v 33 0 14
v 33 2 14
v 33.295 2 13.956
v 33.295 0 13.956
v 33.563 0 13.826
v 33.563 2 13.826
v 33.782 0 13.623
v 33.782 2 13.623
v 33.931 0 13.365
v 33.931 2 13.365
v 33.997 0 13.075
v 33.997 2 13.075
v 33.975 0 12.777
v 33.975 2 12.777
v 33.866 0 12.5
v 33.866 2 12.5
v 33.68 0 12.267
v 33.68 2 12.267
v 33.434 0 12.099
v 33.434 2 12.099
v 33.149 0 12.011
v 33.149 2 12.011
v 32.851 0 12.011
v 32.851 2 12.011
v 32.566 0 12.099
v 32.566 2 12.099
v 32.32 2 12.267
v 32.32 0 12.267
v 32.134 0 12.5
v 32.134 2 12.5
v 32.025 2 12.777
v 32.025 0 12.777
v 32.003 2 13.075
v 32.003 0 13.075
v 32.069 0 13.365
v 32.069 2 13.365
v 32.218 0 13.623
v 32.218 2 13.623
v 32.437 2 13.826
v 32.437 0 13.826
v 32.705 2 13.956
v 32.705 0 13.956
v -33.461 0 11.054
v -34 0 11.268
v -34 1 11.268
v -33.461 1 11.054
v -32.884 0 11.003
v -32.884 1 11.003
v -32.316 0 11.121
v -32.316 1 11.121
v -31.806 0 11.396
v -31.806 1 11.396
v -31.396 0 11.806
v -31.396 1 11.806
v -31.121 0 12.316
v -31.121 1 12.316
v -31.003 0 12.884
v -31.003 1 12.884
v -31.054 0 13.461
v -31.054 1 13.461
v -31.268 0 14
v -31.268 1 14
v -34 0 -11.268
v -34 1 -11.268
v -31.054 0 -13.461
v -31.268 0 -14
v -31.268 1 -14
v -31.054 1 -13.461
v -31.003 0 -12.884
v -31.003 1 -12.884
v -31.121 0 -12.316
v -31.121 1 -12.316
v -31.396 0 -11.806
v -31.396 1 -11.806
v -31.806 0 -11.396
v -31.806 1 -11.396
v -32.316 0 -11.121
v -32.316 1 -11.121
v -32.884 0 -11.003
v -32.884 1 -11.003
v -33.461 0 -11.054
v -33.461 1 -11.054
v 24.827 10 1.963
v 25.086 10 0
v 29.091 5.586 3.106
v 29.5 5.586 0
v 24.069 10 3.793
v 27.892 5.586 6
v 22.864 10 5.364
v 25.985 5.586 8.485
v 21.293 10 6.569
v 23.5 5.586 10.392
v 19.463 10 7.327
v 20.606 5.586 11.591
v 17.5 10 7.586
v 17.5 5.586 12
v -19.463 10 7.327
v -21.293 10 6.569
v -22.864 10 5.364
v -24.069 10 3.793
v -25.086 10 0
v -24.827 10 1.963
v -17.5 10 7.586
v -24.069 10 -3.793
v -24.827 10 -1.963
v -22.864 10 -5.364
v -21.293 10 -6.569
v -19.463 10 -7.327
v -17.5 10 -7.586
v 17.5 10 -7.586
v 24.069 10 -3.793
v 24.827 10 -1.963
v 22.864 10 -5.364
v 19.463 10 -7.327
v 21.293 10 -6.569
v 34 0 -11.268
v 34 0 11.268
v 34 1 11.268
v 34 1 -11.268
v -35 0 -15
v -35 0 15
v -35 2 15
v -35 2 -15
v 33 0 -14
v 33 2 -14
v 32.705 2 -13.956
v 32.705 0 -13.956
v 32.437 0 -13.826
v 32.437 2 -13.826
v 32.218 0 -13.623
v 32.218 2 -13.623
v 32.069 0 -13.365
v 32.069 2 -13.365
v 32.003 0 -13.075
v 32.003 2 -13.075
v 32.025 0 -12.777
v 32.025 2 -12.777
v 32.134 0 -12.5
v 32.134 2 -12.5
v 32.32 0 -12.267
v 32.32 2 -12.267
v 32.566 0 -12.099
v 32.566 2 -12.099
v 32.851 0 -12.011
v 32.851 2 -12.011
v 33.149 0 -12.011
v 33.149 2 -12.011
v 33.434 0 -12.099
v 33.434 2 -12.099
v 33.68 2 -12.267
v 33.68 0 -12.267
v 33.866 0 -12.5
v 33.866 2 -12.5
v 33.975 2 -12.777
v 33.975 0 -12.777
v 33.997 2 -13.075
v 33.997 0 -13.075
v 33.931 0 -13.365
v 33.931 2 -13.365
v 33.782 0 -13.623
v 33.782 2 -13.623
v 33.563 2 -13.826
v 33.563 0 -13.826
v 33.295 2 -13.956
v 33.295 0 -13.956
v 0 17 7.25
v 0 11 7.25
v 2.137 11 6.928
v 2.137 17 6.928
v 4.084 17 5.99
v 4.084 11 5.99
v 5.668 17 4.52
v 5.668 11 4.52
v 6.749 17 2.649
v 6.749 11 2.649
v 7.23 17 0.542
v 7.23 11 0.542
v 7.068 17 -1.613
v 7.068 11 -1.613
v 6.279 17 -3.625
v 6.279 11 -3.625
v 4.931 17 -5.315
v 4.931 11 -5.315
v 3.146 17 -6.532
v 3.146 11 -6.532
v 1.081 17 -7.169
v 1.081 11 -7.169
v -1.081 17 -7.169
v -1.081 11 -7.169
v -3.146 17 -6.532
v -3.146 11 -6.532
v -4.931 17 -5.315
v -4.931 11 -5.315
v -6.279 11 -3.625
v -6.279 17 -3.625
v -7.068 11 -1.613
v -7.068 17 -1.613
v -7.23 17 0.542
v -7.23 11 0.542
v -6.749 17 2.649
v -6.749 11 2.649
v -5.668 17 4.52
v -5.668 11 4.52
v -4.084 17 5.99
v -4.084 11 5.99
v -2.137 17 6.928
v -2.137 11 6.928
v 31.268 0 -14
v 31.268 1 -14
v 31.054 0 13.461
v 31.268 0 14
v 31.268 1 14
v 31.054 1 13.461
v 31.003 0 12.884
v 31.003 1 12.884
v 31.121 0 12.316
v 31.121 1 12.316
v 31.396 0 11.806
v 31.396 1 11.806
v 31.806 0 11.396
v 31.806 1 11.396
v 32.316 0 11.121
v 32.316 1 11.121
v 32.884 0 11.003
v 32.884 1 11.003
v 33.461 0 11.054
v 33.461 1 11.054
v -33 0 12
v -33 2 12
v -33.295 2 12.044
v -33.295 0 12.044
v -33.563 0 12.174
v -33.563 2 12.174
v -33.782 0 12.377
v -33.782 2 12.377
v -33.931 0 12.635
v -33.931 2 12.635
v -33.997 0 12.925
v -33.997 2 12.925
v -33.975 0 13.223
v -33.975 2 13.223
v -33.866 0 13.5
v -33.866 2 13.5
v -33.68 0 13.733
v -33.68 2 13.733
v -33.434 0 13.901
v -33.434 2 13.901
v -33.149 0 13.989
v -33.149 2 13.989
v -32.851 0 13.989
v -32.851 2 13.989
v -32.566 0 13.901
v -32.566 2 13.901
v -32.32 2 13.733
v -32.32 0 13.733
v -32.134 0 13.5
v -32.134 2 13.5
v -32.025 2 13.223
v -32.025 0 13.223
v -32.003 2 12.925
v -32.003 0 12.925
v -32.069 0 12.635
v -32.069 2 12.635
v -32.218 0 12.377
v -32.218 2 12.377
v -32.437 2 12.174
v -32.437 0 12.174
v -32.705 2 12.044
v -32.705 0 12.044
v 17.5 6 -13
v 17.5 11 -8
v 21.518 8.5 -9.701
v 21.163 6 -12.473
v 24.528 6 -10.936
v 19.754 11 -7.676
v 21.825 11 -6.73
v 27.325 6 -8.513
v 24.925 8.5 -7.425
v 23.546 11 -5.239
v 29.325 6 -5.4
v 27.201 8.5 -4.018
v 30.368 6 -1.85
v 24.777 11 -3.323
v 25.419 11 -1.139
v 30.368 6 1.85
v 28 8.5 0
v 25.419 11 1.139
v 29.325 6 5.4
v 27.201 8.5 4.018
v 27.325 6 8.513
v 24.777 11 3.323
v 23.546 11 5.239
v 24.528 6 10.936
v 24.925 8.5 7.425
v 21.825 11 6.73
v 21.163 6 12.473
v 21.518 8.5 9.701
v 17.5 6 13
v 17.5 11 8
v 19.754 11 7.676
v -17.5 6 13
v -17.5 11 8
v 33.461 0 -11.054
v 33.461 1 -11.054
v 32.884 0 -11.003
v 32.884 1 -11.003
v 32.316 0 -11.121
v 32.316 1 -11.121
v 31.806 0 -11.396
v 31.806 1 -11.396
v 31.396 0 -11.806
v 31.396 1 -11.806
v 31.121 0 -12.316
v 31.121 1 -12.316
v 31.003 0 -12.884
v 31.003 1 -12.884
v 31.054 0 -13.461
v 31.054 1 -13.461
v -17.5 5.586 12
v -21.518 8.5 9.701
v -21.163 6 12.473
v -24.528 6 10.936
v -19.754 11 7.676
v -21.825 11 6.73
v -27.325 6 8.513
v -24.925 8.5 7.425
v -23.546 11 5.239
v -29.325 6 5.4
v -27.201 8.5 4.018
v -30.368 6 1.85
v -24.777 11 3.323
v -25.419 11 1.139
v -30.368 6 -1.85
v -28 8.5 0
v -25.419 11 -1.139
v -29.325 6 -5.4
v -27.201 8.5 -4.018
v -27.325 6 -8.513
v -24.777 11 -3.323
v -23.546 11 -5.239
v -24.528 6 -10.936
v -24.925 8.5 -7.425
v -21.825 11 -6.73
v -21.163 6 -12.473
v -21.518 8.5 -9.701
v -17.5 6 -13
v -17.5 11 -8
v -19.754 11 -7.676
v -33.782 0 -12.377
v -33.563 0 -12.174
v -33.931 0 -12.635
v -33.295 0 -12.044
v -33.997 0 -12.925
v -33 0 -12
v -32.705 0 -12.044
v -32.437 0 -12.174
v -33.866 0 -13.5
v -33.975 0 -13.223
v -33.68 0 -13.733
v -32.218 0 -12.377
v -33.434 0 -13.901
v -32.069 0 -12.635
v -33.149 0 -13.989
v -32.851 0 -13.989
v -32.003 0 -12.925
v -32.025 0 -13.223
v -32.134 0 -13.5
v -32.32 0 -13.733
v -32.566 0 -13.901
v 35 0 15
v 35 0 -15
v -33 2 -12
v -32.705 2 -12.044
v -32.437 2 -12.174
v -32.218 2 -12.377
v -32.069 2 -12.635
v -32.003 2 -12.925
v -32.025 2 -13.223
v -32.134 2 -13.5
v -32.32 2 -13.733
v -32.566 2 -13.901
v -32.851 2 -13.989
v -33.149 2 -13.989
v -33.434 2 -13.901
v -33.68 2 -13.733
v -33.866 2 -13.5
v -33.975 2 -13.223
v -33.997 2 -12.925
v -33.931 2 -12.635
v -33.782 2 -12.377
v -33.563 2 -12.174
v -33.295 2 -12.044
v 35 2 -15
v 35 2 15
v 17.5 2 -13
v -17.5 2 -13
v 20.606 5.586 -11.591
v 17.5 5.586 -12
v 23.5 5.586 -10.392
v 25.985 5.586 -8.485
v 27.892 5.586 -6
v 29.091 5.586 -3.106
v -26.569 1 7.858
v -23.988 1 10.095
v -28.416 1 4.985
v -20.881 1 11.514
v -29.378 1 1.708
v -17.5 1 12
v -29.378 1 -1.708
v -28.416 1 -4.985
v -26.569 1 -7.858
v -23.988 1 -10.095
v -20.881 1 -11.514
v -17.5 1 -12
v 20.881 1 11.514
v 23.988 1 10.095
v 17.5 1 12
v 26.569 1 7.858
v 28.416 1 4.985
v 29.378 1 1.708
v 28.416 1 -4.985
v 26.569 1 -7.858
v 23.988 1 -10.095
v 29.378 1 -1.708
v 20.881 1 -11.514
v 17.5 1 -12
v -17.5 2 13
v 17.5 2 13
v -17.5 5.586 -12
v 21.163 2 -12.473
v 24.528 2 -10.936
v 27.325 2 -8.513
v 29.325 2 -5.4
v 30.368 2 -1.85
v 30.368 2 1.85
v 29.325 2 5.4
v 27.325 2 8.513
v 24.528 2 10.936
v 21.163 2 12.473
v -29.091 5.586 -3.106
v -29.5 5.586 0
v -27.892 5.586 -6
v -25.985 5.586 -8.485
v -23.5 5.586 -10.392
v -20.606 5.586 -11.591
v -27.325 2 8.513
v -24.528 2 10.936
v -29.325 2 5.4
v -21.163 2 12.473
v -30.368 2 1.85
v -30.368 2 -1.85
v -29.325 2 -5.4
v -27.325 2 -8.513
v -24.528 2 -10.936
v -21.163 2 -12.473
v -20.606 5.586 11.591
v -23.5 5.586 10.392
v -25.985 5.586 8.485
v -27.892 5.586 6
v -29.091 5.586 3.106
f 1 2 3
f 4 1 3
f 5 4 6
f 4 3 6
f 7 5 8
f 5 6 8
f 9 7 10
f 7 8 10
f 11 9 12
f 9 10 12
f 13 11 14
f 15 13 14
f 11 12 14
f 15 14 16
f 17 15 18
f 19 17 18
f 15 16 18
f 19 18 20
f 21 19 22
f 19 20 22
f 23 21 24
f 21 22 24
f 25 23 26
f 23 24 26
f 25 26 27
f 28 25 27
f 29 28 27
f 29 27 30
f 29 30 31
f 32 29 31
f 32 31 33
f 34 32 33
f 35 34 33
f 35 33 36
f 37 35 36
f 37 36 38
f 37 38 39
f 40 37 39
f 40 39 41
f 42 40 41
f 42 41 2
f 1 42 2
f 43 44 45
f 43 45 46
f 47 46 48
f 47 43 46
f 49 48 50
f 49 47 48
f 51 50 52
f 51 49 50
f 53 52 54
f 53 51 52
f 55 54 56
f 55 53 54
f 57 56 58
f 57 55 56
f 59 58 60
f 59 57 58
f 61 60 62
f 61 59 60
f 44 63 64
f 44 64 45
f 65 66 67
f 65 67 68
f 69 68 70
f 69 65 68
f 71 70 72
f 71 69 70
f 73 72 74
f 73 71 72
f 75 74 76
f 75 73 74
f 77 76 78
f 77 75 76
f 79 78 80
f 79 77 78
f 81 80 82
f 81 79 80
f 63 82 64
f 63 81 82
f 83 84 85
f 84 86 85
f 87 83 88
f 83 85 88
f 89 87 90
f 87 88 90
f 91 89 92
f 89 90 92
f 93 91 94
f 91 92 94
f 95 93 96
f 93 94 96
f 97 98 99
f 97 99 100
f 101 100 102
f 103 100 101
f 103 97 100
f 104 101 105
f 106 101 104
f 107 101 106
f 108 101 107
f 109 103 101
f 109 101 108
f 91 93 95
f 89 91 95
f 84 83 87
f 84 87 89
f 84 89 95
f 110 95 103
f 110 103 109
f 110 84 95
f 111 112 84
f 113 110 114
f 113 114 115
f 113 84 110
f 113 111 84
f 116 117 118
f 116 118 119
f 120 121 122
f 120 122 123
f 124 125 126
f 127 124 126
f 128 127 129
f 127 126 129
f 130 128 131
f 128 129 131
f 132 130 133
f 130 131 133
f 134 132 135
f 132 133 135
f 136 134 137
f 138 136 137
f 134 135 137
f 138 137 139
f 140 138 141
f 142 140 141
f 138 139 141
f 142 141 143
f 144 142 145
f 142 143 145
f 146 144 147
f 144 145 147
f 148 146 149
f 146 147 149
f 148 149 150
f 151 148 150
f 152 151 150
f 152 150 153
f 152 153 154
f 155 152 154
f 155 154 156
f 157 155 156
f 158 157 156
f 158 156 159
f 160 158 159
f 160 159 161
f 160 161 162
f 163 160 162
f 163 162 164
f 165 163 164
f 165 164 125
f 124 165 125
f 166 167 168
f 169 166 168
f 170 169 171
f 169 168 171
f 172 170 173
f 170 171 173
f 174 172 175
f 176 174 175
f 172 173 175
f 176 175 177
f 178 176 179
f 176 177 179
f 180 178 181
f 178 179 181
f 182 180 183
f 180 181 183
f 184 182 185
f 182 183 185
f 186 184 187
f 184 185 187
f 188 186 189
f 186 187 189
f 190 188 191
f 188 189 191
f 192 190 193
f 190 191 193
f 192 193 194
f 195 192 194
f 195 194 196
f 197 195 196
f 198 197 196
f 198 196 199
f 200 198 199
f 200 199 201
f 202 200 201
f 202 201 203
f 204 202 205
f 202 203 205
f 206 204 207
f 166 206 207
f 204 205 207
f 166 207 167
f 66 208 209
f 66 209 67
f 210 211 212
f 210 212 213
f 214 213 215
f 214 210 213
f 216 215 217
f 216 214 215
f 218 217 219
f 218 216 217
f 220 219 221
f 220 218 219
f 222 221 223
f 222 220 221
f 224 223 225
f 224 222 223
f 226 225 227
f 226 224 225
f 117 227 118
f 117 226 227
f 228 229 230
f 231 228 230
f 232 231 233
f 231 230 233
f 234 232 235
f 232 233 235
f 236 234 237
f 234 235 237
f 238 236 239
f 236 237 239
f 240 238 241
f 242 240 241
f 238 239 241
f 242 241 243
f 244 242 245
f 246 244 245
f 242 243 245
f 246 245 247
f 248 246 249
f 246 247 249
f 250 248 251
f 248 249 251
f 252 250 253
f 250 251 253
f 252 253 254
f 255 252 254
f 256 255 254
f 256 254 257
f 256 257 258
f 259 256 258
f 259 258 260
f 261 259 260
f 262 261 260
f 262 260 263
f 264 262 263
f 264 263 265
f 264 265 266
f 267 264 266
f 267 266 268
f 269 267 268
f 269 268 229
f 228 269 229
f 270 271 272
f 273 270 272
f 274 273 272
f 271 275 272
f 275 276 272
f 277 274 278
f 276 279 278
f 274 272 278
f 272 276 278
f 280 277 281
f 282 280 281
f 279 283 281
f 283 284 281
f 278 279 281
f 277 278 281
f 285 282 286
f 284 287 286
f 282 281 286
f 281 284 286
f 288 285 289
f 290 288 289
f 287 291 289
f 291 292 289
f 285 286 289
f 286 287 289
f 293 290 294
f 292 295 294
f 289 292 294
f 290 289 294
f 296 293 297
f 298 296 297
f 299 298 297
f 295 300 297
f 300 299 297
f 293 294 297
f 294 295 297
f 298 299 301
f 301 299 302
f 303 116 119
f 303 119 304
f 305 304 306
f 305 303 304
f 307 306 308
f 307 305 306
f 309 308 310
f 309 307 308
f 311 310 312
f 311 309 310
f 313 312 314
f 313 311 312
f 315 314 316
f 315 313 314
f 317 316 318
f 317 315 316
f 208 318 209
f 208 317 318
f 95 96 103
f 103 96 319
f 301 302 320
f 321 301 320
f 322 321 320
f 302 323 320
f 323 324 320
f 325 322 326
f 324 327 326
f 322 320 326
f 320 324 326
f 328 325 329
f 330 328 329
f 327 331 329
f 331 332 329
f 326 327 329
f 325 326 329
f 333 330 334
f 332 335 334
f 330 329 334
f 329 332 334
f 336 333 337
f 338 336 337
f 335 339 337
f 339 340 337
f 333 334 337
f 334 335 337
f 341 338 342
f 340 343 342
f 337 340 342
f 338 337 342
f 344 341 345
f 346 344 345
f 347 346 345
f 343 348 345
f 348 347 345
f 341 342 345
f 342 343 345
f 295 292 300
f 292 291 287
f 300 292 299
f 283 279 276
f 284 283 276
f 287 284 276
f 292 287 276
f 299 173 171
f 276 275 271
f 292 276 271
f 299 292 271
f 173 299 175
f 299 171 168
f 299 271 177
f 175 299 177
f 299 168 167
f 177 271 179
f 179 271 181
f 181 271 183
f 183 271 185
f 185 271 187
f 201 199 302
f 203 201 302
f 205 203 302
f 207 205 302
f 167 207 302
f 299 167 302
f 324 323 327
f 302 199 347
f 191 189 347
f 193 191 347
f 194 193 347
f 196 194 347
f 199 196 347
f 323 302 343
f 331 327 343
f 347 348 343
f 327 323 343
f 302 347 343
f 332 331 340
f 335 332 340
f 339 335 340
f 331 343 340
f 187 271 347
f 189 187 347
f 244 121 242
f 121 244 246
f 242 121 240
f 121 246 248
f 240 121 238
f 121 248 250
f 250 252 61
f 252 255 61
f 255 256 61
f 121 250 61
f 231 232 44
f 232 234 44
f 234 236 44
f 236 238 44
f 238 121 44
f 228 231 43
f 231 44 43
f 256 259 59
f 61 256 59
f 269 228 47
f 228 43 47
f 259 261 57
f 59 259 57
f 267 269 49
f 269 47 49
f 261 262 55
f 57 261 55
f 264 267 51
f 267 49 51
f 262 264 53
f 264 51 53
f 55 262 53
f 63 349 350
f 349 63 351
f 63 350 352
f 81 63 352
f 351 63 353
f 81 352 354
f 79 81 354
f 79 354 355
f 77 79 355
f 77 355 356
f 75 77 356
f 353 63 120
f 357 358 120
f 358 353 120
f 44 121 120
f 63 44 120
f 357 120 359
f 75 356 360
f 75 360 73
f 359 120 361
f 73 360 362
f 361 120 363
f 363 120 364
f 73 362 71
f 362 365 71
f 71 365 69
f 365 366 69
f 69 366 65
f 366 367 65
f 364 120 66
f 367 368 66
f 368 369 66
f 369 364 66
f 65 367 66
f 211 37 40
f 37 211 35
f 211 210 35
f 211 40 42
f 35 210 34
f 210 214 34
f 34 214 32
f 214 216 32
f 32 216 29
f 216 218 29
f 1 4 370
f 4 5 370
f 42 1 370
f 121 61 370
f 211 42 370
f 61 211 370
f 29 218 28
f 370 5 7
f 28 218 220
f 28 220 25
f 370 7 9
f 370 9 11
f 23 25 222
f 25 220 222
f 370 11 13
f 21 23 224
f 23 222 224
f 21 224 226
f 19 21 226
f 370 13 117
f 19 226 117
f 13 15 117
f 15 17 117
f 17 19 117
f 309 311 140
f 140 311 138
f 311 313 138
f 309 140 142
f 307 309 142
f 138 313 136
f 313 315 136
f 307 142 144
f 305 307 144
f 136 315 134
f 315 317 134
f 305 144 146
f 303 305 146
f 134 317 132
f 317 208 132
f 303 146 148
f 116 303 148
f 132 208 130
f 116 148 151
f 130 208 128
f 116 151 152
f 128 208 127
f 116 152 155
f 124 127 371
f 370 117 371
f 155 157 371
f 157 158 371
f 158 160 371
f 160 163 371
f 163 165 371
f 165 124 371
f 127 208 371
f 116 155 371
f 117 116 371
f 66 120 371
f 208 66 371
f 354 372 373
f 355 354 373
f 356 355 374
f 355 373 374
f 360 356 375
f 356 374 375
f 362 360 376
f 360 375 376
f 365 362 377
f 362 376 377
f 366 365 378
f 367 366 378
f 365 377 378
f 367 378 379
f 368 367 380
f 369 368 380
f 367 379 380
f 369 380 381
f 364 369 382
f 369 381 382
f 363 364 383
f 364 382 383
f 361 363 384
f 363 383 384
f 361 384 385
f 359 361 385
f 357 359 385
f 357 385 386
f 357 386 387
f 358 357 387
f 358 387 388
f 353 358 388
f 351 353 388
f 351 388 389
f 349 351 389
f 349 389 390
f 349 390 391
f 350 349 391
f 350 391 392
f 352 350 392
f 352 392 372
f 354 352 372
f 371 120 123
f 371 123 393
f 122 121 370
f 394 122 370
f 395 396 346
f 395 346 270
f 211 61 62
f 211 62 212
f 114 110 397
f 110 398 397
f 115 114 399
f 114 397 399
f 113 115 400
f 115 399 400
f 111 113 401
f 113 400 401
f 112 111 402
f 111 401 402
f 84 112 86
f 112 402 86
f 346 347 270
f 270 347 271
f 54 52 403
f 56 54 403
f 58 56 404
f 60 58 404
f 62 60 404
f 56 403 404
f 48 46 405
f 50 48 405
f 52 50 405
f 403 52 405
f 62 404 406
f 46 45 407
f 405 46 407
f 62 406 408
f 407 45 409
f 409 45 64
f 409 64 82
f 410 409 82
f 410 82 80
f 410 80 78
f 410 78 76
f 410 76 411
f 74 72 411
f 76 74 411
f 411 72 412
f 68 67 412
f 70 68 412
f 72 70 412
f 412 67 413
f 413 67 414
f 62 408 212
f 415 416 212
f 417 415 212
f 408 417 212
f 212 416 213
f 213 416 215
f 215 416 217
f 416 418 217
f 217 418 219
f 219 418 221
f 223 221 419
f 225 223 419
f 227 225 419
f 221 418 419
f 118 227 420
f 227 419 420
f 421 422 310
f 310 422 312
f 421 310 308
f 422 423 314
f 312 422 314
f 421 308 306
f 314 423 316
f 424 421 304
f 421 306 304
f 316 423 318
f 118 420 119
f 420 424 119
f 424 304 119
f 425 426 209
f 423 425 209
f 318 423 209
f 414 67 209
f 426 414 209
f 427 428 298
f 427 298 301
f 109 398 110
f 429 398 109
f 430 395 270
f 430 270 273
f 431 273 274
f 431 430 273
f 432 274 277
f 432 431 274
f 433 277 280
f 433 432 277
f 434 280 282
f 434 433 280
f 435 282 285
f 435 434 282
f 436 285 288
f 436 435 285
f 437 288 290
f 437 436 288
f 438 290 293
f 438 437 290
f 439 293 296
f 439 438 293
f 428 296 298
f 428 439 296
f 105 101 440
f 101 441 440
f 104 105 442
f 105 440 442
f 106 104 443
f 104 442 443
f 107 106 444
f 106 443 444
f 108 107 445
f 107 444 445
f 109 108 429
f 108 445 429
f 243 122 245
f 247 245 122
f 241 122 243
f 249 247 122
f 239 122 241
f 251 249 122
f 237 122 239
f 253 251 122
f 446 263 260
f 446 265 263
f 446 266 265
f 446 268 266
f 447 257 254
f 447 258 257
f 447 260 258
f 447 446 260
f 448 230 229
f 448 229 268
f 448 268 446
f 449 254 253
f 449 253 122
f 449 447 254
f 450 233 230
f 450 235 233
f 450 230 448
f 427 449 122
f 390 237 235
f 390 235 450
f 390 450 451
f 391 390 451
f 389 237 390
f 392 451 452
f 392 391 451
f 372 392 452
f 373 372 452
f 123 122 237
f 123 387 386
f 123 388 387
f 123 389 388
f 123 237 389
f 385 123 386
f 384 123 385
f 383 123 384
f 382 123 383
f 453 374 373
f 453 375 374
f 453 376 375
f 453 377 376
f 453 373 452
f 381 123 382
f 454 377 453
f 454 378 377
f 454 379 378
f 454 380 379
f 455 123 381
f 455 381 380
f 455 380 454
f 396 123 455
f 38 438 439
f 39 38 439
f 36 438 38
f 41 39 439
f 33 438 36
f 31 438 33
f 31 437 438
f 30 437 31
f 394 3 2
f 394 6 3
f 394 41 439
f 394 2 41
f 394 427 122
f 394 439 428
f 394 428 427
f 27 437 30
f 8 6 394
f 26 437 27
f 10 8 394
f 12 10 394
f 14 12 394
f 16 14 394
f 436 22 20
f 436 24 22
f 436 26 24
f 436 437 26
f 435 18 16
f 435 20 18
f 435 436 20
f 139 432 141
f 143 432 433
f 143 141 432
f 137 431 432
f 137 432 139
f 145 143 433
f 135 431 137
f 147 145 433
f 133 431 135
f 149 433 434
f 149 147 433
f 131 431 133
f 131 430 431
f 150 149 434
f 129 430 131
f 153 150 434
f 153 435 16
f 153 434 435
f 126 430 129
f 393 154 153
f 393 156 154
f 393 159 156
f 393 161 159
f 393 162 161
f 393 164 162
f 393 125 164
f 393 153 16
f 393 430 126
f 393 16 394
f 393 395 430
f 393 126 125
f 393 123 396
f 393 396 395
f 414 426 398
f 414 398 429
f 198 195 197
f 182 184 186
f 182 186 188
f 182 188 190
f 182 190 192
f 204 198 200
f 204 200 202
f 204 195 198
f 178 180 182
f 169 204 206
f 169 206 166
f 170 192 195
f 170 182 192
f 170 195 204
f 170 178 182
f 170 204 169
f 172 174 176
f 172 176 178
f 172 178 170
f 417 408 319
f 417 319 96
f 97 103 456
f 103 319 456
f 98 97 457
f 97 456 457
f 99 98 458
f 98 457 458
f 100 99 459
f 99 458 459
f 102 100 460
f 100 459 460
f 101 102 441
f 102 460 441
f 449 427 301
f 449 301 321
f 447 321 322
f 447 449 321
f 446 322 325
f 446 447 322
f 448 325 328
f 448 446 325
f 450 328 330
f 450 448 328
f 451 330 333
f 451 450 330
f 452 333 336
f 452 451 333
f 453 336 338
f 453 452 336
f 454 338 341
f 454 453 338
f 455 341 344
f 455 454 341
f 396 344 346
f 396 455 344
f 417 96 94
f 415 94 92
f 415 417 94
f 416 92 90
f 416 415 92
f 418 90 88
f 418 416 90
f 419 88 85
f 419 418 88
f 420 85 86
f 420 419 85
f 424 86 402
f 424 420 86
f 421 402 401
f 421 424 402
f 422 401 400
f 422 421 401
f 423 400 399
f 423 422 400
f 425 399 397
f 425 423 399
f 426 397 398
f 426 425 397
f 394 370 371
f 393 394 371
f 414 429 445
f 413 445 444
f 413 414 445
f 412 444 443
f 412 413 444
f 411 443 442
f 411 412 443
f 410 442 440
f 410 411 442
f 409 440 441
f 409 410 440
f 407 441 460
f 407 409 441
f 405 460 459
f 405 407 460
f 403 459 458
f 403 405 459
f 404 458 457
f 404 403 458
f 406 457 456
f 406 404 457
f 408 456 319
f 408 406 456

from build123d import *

# Parameters (mm, degrees)
SKETCH_1_W          = 70
SKETCH_1_H          = 30
EXTRUDE_1_DEPTH     = 2
SKETCH_2_R          = 1
CUT_EXTRUDE_1_DEPTH = 39.13135193
EXTRUDE_2_DEPTH     = 9
CHAMFER_2_SIZE      = 5
SHELL_2_DEPTH       = 5.585786438
SHELL_2_2_DEPTH     = 1
SKETCH_4_R          = 7.25
EXTRUDE_3_DEPTH     = 6


with BuildPart() as part:
    # 草图1 → 凸台-拉伸1 (new body)
    with BuildSketch(Plane(origin=(0, 0, 0), x_dir=(1, 0, 0), z_dir=(0, 1, 0))):
        Rectangle(SKETCH_1_W, SKETCH_1_H)
    extrude(amount=EXTRUDE_1_DEPTH)

    # 草图2 → 切除-拉伸1 (cut, through all)
    with BuildSketch(Plane(origin=(0, 2, 0), x_dir=(1, 0, 0), z_dir=(0, 1, 0))):
        with Locations(Location((-33, 13, 0), (0, 0, 270))):
            Circle(SKETCH_2_R)
        with Locations(Location((33, 13, 0), (0, 0, 90))):
            Circle(SKETCH_2_R)
        with Locations(Location((33, -13, 0), (0, 0, 270))):
            Circle(SKETCH_2_R)
        with Locations(Location((-33, -13, 0), (0, 0, 90))):
            Circle(SKETCH_2_R)
    extrude(amount=-CUT_EXTRUDE_1_DEPTH, mode=Mode.SUBTRACT)

    # 草图3 → 凸台-拉伸2 (add)
    with BuildSketch(Plane(origin=(0, 2, 0), x_dir=(1, 0, 0), z_dir=(0, 1, 0))):
        with BuildLine():
            Line((-17.5, 13), (17.5, 13))
            ThreePointArc((17.5, 13), (30.5, 0), (17.5, -13))
            Line((17.5, -13), (-17.5, -13))
            ThreePointArc((-17.5, -13), (-30.5, 0), (-17.5, 13))
        make_face()
    extrude(amount=EXTRUDE_2_DEPTH)

    # 倒角2
    chamfer_2_edges = [part.edges().sort_by_distance(p)[0] for p in [
        (-30.5, 11, 0),
        (0, 11, 13),
        (30.5, 11, 0),
        (0, 11, -13),
    ]]
    chamfer(chamfer_2_edges, length=CHAMFER_2_SIZE)

    # 抽壳2: read off the stored shape, not the designer's step
    # 抽壳2 outline → 抽壳2 (cut)
    with BuildSketch(Plane(origin=(0, 0, 0), x_dir=(1, 0, 0), z_dir=(0, 1, 0))):
        with BuildLine():
            ThreePointArc((-17.5, 12), (-29.5, 0), (-17.5, -12))
            Line((-17.5, -12), (17.5, -12))
            ThreePointArc((17.5, -12), (29.5, 0), (17.5, 12))
            Line((17.5, 12), (-17.5, 12))
        make_face()
    extrude(amount=SHELL_2_DEPTH, mode=Mode.SUBTRACT)

    # Shell 2 2 outline → Shell 2 2 (cut)
    with BuildSketch(Plane(origin=(0, 0, 0), x_dir=(1, 0, 0), z_dir=(0, 1, 0))):
        with BuildLine():
            Line((-34, 11.267949192), (-34, -11.267949192))
            ThreePointArc((-34, -11.267949192), (-31.585786438, -11.585786438), (-31.267949192, -14))
            Line((-31.267949192, -14), (31.267949192, -14))
            ThreePointArc((31.267949192, -14), (31.585786438, -11.585786438), (34, -11.267949192))
            Line((34, -11.267949192), (34, 11.267949192))
            ThreePointArc((34, 11.267949192), (31.585786438, 11.585786438), (31.267949192, 14))
            Line((31.267949192, 14), (-31.267949192, 14))
            ThreePointArc((-31.267949192, 14), (-31.585786438, 11.585786438), (-34, 11.267949192))
        make_face()
        with BuildLine():
            Line((17.5, -12), (-17.5, -12))
            ThreePointArc((-17.5, -12), (-29.5, 0), (-17.5, 12))
            Line((-17.5, 12), (17.5, 12))
            ThreePointArc((17.5, 12), (29.5, 0), (17.5, -12))
        make_face(mode=Mode.SUBTRACT)
    extrude(amount=SHELL_2_2_DEPTH, mode=Mode.SUBTRACT)

    # Shell 2 3: loft between two sections, ruled curve by curve
    shell_2_3_from = [
        Edge.make_three_point_arc((17.5, 10, -7.585786438), (22.863961031, 10, -5.363961031), (25.085786438, 10, 0)),
        Edge.make_three_point_arc((25.085786438, 10, 0), (22.863961031, 10, 5.363961031), (17.5, 10, 7.585786438)),
        Edge.make_three_point_arc((-17.5, 10, 7.585786438), (-22.863961031, 10, 5.363961031), (-25.085786438, 10, 0)),
        Edge.make_three_point_arc((-25.085786438, 10, 0), (-22.863961031, 10, -5.363961031), (-17.5, 10, -7.585786438)),
        Edge.make_line((17.5, 10, -7.585786438), (-17.5, 10, -7.585786438)),
        Edge.make_line((17.5, 10, 7.585786438), (-17.5, 10, 7.585786438)),
    ]
    shell_2_3_to = [
        Edge.make_three_point_arc((17.5, 5.585786438, -12), (25.985281374, 5.585786438, -8.485281374), (29.5, 5.585786438, 0)),
        Edge.make_three_point_arc((29.5, 5.585786438, 0), (25.985281374, 5.585786438, 8.485281374), (17.5, 5.585786438, 12)),
        Edge.make_three_point_arc((-17.5, 5.585786438, 12), (-25.985281374, 5.585786438, 8.485281374), (-29.5, 5.585786438, 0)),
        Edge.make_three_point_arc((-29.5, 5.585786438, 0), (-25.985281374, 5.585786438, -8.485281374), (-17.5, 5.585786438, -12)),
        Edge.make_line((17.5, 5.585786438, -12), (-17.5, 5.585786438, -12)),
        Edge.make_line((17.5, 5.585786438, 12), (-17.5, 5.585786438, 12)),
    ]
    shell_2_3 = Solid(Shell([*[Face.make_surface_from_curves(shell_2_3_from[k], shell_2_3_to[k]) for k in range(6)], Face(Wire(shell_2_3_from)), Face(Wire(shell_2_3_to))]))
    add(shell_2_3, mode=Mode.SUBTRACT)

    # 草图4 → 凸台-拉伸3 (add)
    with BuildSketch(Plane(origin=(0, 11, 0), x_dir=(1, 0, 0), z_dir=(0, 1, 0))):
        with Locations(Location((0, 0, 0), (0, 0, 270))):
            Circle(SKETCH_4_R)
    extrude(amount=EXTRUDE_3_DEPTH)


solid = part.part
